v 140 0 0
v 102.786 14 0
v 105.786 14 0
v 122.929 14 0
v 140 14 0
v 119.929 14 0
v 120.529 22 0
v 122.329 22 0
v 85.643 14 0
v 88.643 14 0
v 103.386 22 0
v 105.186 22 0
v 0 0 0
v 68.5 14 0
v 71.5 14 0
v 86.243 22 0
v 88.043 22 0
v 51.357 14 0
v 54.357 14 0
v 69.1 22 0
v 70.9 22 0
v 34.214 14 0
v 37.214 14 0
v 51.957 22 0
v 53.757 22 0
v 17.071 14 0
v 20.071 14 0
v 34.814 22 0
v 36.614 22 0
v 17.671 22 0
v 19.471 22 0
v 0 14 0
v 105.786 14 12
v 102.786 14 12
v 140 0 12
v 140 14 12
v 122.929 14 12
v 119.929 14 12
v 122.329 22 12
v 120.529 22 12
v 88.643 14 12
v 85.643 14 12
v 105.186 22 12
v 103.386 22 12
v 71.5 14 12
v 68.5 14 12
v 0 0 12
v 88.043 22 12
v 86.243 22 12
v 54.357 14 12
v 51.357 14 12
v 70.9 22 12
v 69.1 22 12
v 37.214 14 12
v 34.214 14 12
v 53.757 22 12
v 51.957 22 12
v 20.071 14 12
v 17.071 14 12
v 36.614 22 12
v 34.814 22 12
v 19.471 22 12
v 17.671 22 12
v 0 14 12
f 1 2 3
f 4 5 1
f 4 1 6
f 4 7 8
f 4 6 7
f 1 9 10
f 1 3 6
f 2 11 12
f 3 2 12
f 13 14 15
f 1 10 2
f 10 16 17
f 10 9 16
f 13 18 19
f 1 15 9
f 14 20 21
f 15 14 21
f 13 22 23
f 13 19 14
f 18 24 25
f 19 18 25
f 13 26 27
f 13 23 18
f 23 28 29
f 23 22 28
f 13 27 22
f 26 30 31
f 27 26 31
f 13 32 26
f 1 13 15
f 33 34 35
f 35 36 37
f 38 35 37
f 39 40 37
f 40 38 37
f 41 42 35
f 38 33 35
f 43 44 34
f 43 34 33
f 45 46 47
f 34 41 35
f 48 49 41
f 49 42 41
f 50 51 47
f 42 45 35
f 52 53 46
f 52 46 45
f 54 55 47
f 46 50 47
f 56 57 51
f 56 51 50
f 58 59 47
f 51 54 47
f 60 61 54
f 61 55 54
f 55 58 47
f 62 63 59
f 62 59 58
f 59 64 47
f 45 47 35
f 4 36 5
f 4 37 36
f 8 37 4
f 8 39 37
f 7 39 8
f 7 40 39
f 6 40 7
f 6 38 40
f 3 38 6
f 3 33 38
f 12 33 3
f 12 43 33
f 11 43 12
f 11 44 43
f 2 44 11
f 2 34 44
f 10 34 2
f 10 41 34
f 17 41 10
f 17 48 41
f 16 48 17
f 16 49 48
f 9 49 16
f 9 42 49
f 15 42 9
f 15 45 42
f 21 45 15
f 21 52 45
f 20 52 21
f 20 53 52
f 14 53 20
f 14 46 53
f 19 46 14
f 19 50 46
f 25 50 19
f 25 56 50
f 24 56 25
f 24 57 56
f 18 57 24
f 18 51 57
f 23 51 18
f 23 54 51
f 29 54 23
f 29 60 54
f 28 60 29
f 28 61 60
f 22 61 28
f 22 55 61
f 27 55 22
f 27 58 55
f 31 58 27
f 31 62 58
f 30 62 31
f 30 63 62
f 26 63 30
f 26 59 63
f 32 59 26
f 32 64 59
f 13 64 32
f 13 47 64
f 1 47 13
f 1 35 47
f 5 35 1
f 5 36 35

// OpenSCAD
$fn = 32;

// ----------------------------------------------------------------------
// Gear rack: 7 teeth on a 140 mm bar, pitch 17.14 mm
// ----------------------------------------------------------------------

// --- parameters (mm) ---
profile_height = 12;      // extrusion height
profile_points = 32;      // points of the closed outline

profile = [[0, 0], [140, 0], [140, 14], [122.929, 14], [122.329, 22], [120.529, 22], [119.929, 14], [105.786, 14], [105.186, 22], [103.386, 22], [102.786, 14], [88.643, 14], [88.043, 22], [86.243, 22], [85.643, 14], [71.5, 14], [70.9, 22], [69.1, 22], [68.5, 14], [54.357, 14], [53.757, 22], [51.957, 22], [51.357, 14], [37.214, 14], [36.614, 22], [34.814, 22], [34.214, 14], [20.071, 14], [19.471, 22], [17.671, 22], [17.071, 14], [0, 14]];  // single closed polygon, 32 points, counter clockwise

// --- the one profile operation ---
linear_extrude(height = profile_height) polygon(points = profile);
